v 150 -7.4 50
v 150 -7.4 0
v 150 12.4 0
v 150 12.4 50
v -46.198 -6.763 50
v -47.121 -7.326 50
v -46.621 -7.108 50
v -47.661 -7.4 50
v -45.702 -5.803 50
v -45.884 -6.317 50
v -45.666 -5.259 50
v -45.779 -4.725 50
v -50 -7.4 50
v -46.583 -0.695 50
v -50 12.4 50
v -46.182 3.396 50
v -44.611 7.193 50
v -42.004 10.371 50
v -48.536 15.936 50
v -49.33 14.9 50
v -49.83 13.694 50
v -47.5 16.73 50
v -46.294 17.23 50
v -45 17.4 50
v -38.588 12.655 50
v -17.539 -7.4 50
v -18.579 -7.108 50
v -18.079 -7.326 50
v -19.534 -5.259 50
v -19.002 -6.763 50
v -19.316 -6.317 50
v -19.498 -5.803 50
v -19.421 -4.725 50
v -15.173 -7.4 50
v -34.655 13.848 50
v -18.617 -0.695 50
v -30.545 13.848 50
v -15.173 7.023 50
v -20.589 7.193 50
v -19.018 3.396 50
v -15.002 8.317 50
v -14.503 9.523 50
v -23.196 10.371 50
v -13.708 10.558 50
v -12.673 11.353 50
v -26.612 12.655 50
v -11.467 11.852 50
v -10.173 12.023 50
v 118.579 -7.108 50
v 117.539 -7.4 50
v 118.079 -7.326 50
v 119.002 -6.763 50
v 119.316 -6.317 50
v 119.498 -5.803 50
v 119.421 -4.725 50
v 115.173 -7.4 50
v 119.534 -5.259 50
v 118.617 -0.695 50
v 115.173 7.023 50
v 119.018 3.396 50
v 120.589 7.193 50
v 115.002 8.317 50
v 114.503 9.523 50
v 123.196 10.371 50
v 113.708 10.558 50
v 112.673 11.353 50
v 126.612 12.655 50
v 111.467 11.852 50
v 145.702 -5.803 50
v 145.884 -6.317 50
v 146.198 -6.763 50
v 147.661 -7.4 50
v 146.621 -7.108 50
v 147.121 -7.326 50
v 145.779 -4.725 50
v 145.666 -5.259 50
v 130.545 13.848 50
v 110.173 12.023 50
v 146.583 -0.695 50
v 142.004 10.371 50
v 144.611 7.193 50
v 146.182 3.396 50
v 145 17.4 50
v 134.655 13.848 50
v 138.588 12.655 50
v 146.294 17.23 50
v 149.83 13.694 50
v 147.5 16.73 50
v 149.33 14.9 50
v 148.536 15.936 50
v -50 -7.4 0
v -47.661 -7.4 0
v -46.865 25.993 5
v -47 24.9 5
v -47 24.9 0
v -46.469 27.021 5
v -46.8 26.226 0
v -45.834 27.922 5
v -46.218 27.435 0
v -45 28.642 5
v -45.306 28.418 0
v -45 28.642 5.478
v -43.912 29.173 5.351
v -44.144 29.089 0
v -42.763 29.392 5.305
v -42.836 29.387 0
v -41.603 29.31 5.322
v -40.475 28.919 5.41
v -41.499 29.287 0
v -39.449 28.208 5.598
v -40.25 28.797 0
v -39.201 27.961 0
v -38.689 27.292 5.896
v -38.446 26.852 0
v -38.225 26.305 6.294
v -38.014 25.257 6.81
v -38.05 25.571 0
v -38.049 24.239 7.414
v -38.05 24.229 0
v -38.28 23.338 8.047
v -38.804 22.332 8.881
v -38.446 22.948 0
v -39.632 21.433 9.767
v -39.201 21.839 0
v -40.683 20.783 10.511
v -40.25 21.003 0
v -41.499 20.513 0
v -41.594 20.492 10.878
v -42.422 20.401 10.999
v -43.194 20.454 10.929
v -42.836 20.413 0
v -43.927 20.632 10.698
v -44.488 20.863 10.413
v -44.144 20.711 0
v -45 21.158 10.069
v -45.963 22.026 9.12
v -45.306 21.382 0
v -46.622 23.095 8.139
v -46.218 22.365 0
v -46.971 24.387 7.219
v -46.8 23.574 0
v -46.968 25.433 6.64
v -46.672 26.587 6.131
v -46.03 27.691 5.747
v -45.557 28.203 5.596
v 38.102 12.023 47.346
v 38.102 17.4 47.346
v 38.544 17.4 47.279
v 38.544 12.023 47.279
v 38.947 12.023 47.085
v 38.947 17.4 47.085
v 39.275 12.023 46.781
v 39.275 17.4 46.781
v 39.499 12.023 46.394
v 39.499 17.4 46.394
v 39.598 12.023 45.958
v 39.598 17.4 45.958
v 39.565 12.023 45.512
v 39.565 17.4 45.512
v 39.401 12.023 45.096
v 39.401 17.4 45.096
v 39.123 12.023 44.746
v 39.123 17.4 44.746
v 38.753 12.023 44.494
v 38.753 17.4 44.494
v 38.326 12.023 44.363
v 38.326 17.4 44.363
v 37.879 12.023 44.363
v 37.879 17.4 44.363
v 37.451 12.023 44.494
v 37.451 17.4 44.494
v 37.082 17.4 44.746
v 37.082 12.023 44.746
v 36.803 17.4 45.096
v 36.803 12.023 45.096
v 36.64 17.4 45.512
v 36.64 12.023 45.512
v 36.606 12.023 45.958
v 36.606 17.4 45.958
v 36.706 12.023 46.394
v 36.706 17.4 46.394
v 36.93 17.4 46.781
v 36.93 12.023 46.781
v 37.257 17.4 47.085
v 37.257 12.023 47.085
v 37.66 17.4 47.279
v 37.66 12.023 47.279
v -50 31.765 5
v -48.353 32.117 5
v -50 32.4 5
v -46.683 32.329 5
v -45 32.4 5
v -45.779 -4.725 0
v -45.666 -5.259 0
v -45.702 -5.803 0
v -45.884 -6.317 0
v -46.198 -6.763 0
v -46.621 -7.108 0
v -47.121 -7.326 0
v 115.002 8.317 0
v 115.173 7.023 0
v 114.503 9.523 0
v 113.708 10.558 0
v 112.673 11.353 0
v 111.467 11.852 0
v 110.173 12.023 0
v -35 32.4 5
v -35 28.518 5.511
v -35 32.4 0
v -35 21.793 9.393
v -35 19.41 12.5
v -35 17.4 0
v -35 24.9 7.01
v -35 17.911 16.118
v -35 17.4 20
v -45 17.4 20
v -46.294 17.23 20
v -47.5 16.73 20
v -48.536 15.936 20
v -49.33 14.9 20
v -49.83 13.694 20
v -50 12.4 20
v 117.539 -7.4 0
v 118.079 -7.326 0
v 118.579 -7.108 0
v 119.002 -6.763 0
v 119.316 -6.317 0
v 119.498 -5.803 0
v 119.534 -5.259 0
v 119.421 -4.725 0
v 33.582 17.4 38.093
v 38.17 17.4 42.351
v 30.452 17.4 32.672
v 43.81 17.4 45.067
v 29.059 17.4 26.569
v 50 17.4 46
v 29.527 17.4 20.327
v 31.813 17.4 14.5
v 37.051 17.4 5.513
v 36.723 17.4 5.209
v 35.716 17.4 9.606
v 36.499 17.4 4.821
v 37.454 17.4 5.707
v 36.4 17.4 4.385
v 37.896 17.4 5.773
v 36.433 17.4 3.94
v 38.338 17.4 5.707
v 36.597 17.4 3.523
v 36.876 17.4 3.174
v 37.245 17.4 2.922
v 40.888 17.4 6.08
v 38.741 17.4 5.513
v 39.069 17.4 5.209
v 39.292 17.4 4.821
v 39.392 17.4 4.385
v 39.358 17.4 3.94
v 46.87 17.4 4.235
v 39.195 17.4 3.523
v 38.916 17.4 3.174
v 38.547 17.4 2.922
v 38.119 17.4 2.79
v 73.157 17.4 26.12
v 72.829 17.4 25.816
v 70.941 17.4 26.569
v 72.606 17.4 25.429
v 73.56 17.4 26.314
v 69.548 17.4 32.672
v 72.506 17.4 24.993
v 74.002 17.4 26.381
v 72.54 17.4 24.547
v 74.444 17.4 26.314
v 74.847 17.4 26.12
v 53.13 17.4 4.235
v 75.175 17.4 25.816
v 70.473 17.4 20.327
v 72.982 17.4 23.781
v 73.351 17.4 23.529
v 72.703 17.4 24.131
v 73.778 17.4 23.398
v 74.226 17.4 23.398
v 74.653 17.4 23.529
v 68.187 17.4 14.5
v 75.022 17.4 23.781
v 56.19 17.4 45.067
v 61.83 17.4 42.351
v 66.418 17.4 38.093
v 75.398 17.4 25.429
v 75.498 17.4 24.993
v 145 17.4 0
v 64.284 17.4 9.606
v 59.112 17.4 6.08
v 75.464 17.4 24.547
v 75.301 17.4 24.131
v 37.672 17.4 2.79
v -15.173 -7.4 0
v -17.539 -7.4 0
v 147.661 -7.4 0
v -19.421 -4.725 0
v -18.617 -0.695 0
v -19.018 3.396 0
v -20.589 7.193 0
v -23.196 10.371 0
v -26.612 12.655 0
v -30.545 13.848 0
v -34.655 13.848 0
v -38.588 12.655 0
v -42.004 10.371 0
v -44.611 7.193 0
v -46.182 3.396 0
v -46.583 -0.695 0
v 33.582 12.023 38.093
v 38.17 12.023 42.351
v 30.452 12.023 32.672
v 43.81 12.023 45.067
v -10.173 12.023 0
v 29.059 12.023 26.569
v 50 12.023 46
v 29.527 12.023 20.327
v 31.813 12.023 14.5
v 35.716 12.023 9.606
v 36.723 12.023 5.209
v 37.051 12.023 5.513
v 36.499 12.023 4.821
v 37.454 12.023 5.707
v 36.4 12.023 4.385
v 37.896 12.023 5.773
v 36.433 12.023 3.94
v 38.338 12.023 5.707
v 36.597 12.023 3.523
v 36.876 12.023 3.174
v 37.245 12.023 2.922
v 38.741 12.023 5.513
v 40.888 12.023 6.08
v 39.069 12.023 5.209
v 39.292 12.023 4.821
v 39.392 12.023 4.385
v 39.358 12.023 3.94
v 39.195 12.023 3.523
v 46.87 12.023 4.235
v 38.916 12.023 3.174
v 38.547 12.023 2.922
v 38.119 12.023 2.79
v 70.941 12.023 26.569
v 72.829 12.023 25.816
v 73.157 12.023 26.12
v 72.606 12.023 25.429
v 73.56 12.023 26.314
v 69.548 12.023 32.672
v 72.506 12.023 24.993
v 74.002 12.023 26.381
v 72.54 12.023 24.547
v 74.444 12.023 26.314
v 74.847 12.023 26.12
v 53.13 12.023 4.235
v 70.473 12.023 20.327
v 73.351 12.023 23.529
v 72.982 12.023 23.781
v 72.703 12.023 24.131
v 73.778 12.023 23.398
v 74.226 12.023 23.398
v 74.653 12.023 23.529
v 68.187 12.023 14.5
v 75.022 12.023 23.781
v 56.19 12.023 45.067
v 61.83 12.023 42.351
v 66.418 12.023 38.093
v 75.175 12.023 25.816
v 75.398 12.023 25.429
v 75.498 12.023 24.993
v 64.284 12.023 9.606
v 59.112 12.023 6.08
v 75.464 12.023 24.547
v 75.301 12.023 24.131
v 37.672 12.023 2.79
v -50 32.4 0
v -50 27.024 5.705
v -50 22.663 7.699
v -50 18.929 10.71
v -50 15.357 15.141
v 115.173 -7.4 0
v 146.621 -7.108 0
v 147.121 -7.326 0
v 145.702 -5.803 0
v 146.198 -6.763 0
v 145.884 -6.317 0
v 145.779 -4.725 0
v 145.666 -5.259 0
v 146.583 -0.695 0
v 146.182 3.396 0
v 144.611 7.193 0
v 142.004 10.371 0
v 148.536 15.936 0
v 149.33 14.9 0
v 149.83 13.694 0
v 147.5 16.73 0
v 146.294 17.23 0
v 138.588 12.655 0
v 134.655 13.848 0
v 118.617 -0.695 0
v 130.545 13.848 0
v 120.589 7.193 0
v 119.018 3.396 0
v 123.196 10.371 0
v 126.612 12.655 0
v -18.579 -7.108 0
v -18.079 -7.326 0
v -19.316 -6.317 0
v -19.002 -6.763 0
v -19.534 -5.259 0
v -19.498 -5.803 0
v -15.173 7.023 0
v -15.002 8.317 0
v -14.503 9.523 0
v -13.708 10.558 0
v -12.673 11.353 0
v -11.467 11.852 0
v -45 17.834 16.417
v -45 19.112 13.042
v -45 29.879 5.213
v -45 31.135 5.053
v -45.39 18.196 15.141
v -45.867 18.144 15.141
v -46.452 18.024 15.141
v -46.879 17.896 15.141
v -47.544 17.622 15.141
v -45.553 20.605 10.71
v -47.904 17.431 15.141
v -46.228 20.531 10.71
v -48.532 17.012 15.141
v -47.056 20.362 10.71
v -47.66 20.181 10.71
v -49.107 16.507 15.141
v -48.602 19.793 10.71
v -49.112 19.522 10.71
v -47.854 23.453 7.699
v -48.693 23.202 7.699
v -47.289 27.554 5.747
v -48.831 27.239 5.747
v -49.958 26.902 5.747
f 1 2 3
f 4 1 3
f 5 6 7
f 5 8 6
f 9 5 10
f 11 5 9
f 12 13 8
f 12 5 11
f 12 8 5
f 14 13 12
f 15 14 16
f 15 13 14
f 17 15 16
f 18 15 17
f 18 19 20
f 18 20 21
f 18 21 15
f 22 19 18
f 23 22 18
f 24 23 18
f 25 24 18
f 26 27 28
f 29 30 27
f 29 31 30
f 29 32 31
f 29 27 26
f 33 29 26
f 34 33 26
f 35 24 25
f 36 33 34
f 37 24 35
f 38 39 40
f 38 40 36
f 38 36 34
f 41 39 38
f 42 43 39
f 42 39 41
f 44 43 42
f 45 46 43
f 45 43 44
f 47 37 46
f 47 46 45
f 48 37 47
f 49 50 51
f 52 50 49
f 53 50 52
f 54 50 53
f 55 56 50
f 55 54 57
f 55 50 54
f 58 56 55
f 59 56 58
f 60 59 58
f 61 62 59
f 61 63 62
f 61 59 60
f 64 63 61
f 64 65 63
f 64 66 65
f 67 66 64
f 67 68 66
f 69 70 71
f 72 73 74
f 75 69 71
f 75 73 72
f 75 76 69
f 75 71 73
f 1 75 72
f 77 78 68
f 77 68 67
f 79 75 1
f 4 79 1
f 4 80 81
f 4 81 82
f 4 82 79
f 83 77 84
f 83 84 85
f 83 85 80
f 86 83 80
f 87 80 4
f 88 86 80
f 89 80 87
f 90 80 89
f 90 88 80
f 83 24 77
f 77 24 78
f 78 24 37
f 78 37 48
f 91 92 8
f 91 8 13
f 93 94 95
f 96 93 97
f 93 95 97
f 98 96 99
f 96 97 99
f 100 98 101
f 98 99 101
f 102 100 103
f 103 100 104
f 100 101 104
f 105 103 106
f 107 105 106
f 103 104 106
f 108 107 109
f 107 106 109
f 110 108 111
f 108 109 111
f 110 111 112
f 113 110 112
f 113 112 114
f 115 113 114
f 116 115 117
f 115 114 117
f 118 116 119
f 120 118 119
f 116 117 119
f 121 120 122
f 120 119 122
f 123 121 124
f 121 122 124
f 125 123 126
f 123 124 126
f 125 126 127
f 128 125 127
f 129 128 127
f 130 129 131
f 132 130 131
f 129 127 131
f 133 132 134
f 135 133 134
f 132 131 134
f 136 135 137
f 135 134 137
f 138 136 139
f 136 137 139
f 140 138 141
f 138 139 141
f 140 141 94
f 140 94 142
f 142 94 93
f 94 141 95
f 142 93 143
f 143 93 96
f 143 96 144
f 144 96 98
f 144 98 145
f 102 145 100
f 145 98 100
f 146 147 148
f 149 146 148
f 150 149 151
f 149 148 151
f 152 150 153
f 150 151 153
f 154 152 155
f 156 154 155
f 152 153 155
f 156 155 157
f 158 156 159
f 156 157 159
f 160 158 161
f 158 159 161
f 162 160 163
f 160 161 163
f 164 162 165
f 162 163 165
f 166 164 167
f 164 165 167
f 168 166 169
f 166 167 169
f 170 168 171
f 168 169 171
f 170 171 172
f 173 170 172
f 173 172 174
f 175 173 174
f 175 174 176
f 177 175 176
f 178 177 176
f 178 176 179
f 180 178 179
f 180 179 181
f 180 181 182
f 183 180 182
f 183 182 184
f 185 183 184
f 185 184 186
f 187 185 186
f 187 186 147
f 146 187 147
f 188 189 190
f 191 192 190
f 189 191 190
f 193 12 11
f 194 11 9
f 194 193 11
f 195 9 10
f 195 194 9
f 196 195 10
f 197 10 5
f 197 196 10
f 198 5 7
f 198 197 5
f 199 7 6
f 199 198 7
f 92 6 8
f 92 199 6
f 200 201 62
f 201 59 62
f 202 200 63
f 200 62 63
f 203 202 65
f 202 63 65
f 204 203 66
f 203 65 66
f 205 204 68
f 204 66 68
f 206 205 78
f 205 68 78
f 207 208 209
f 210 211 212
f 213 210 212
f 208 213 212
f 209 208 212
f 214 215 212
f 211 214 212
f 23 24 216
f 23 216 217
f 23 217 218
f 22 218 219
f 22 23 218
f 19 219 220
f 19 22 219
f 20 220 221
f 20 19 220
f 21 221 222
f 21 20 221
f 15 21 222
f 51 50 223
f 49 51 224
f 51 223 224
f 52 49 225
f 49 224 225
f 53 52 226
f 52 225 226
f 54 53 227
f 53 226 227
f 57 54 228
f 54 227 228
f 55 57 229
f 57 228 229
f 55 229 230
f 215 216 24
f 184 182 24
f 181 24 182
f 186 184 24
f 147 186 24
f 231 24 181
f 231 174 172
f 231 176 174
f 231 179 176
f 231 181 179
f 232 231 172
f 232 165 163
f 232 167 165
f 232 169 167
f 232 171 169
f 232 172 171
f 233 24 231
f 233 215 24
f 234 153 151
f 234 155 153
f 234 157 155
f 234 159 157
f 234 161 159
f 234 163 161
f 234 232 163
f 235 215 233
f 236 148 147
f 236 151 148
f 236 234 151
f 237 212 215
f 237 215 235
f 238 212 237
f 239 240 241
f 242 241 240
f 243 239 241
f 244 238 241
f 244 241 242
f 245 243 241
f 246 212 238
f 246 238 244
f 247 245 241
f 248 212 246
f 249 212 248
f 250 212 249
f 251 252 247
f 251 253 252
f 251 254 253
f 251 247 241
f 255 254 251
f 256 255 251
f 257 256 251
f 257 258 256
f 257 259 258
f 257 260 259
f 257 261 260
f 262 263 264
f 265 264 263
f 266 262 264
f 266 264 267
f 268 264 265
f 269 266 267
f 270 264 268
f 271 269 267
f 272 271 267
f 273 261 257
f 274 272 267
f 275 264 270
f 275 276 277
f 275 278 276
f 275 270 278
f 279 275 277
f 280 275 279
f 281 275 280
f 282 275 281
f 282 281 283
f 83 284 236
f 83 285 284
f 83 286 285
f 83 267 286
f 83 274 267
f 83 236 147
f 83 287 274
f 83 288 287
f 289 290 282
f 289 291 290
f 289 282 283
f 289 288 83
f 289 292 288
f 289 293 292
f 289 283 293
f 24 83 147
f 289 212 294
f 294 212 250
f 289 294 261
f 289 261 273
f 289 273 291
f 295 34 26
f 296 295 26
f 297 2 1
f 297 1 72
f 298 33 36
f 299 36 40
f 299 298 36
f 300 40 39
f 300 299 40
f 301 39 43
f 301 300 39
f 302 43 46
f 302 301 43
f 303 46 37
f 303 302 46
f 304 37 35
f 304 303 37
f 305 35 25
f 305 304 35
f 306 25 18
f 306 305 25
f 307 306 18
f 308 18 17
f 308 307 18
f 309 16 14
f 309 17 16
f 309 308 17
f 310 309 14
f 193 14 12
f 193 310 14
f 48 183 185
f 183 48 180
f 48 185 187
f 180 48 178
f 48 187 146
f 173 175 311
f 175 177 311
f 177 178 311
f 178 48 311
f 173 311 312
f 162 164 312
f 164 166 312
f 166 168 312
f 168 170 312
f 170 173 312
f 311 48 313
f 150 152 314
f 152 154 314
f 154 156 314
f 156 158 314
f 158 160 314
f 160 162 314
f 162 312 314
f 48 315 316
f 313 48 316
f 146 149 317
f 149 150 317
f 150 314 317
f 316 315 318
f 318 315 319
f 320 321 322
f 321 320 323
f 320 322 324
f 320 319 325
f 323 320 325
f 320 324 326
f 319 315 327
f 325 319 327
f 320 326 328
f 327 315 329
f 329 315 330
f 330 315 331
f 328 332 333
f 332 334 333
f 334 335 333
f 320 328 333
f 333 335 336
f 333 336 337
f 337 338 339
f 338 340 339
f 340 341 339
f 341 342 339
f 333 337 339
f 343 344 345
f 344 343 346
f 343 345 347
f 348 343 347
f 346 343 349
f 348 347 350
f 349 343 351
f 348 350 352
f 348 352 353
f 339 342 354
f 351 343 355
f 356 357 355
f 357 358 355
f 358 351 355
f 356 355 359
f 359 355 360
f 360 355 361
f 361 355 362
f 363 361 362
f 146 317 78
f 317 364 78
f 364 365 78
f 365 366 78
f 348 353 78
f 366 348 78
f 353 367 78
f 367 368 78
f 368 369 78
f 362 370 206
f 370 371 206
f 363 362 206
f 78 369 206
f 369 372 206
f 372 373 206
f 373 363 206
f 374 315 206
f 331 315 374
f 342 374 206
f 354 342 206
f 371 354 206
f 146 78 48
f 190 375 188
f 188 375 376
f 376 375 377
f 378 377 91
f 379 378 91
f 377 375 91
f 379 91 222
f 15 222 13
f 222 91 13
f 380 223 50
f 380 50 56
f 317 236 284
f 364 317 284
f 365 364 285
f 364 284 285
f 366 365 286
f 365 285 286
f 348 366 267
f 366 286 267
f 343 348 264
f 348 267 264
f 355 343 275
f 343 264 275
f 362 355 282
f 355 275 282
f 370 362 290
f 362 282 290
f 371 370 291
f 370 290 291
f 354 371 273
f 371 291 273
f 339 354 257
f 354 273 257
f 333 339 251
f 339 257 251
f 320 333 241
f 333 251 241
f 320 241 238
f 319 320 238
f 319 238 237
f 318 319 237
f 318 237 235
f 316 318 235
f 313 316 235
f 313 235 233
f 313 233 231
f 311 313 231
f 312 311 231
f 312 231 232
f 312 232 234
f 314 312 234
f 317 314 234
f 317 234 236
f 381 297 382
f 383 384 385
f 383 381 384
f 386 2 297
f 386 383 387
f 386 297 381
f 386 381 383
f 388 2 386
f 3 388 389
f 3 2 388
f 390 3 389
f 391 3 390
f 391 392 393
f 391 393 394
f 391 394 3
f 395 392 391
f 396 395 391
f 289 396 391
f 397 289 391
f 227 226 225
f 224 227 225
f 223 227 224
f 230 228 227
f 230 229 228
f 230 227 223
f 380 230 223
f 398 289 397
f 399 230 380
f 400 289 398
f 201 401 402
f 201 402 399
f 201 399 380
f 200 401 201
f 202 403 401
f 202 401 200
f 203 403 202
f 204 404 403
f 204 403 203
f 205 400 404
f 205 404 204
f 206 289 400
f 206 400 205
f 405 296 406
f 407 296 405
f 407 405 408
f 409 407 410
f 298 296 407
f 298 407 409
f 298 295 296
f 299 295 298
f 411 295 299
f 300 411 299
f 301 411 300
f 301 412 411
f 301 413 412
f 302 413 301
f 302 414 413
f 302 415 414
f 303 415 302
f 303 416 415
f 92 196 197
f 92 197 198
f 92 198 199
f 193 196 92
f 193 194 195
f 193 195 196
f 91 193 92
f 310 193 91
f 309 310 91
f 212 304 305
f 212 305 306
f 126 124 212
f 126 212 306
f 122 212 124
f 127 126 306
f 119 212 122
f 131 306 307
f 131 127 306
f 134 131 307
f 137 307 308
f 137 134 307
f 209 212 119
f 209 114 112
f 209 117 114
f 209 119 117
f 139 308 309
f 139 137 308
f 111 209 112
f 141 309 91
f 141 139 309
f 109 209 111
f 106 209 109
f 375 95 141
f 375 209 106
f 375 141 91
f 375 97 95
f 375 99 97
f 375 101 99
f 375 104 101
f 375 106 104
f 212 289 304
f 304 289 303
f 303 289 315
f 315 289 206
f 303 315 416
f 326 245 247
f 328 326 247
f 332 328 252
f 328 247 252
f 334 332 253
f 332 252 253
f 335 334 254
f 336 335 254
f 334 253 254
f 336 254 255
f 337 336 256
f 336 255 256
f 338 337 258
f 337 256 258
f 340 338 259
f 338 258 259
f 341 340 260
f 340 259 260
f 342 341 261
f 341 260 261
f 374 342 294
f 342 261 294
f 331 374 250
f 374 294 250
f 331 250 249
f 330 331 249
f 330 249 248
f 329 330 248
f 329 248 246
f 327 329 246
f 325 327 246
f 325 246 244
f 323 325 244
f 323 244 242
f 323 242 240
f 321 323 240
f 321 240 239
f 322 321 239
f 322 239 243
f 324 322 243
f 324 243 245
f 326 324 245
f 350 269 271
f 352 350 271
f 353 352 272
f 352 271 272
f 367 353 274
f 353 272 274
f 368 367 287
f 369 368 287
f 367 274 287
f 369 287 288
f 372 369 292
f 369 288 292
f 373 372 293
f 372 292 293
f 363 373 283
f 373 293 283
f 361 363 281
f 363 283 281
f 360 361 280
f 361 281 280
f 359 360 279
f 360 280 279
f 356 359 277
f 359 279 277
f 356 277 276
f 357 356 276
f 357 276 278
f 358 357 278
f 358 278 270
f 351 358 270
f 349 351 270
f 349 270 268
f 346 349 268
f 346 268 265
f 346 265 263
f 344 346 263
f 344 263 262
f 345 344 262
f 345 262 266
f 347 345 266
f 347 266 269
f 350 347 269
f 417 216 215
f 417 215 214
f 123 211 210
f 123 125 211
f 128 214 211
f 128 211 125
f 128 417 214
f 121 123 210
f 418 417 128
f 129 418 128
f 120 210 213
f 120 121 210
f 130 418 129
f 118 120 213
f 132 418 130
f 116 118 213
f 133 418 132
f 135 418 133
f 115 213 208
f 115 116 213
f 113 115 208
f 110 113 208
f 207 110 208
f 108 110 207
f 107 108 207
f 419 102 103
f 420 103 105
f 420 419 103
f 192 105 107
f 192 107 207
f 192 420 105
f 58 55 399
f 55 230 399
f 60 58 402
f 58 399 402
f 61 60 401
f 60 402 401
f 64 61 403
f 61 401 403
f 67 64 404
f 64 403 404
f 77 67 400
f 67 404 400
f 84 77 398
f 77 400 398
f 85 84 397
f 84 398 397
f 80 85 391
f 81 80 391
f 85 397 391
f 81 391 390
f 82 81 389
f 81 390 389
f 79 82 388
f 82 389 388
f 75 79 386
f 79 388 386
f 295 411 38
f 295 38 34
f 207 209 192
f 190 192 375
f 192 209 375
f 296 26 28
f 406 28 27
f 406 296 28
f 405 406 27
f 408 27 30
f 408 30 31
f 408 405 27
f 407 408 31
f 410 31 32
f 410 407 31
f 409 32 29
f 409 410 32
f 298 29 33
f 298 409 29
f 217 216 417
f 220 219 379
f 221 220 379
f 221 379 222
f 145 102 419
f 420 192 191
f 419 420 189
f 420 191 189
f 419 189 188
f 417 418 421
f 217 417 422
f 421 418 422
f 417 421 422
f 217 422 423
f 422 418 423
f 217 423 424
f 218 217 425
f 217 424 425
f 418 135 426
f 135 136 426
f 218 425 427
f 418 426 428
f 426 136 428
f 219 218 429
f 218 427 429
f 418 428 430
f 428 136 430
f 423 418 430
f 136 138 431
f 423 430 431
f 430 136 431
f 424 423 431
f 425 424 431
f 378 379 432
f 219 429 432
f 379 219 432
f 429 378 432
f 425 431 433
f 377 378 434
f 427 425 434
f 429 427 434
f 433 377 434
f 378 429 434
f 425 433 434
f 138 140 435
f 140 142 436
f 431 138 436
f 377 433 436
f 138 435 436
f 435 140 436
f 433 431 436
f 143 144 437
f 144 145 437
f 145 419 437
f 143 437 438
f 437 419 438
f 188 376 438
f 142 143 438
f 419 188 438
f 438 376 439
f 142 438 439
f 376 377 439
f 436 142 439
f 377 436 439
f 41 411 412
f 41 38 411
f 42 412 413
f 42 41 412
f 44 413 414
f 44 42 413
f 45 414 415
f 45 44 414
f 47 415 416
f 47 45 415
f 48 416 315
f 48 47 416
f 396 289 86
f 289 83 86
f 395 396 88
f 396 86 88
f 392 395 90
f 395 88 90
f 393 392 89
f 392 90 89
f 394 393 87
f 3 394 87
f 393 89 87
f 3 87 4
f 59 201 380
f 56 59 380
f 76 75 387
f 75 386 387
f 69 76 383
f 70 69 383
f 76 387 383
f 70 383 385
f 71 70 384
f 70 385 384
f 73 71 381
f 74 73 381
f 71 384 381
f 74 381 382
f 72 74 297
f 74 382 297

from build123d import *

# Parameters (mm, degrees)
SKETCH1_R           = 14
BOSS_EXTRUDE1_DEPTH = 50
SKETCH2_R           = 21
CUT_EXTRUDE1_DEPTH  = 45
SKETCH3_R           = 1.5
CUT_EXTRUDE2_DEPTH  = 45
SKETCH4_W           = 15
SKETCH4_H           = 15
BOSS_EXTRUDE2_DEPTH = 5
SKETCH5_R           = 4.5
CUT_EXTRUDE3_DEPTH  = 5
FILLET1_R           = 5
FILLET2_R           = 15
SKETCH7_W           = 200
SKETCH7_H           = 10
CUT_EXTRUDE4_DEPTH  = 50
FILLET3_R           = 2


with BuildPart() as part:
    # Sketch1 → Boss-Extrude1 (new body)
    with BuildSketch(Plane.XY):
        Polygon((-50, 17.4), (-15.2, 17.4), (50, 17.4), (50, 12.022605171), (-15.17275181, 12.022605171), (-15.17275181, -17.4), (-50, -17.4), align=None)
        with Locations((-32.6, 0)):
            Circle(SKETCH1_R, mode=Mode.SUBTRACT)
    boss_extrude1 = extrude(amount=BOSS_EXTRUDE1_DEPTH)

    # Mirror1: Boss-Extrude1 across plane
    add(boss_extrude1.mirror(Plane(origin=(50, 17.4, 50), x_dir=(0, 0, 1), z_dir=(-1, 0, 0))))

    # Sketch2 → Cut-Extrude1 (cut)
    with BuildSketch(Plane(origin=(0, 17.4, 0), x_dir=(1, 0, 0), z_dir=(0, 1, 0))):
        with Locations(Location((50, -25, 0), (0, 0, 270))):
            Circle(SKETCH2_R)
    extrude(amount=-CUT_EXTRUDE1_DEPTH, mode=Mode.SUBTRACT)

    # Sketch3 → Cut-Extrude2 (cut)
    with BuildSketch(Plane(origin=(0, 17.4, 0), x_dir=(1, 0, 0), z_dir=(0, 1, 0))):
        with Locations(Location((37.89578471, -4.273302643, 0), (0, 0, 270))):
            Circle(SKETCH3_R)
        with Locations(Location((74.001954093, -24.880790745, 0), (0, 0, 270))):
            Circle(SKETCH3_R)
        with Locations(Location((38.102261197, -45.845906612, 0), (0, 0, 270))):
            Circle(SKETCH3_R)
    extrude(amount=-CUT_EXTRUDE2_DEPTH, mode=Mode.SUBTRACT)

    # Sketch4 → Boss-Extrude2 (add)
    with BuildSketch(Plane(origin=(0, 0, 0), x_dir=(-1, 0, 0), z_dir=(0, 0, -1))):
        with Locations((42.5, 24.9)):
            Rectangle(SKETCH4_W, SKETCH4_H)
    extrude(amount=-BOSS_EXTRUDE2_DEPTH)

    # Sketch5 → Cut-Extrude3 (cut)
    with BuildSketch(Plane(origin=(0, 0, 0), x_dir=(-1, 0, 0), z_dir=(0, 0, -1))):
        with Locations((42.5, 24.9)):
            Circle(SKETCH5_R)
    extrude(amount=-CUT_EXTRUDE3_DEPTH, mode=Mode.SUBTRACT)

    # Fillet1
    fillet1_edges = [part.edges().sort_by_distance(p)[0] for p in [
        (-50, 17.4, 27.5),
        (-15.17275181, 12.022605171, 25),
        (-15.17275181, -17.4, 25),
        (-50, -17.4, 25),
        (150, -17.4, 25),
        (150, 17.4, 25),
        (115.17275181, 12.022605171, 25),
        (115.17275181, -17.4, 25),
    ]]
    fillet(fillet1_edges, radius=FILLET1_R)

    # Fillet2
    # the kernel refuses this fillet: 15 mm, written as the material it adds along each edge
    with BuildSketch(Plane(origin=(-45, 12.4, 5), x_dir=(0, 1, 0), z_dir=(1, 0, 0))) as fillet2_piece_1_section:
        with BuildLine():
            CenterArc((5 + FILLET2_R, FILLET2_R), FILLET2_R, 180, 90)
            Line((5 + FILLET2_R, 0), (5, 0))
            Line((5, 0), (5, FILLET2_R))
        make_face()
    fillet2_piece_1 = revolve(axis=Axis((-45, 12.4, 5), (0, 0, 1)), revolution_arc=359.64, mode=Mode.PRIVATE)
    fillet2_piece_1 = split(fillet2_piece_1, bisect_by=Plane(origin=(-50, 16.22028394, 10.678167657), z_dir=(1, 0, 0)), keep=Keep.TOP, mode=Mode.PRIVATE)
    fillet2_piece_1 = fillet2_piece_1 - Plane(origin=(-42.5, 24.9, 10.678167657), x_dir=(-1, 0, 0), z_dir=(0, 0, -1)) * Cylinder(4.5, 80, mode=Mode.PRIVATE)
    fillet2_piece_1 = fillet2_piece_1 - Plane(origin=(-32.6, 0, 10.678167657), x_dir=(1, 0, 0), z_dir=(0, 0, -1)) * Cylinder(14, 80, mode=Mode.PRIVATE)
    fillet2_piece_1 = split(fillet2_piece_1, bisect_by=Plane(origin=(-35, 16.22028394, 10.678167657), z_dir=(-1, 0, 0)), keep=Keep.TOP, mode=Mode.PRIVATE)
    add(fillet2_piece_1)
    with BuildSketch(Plane(origin=(-45, 17.4, 5), x_dir=(0, 0, 1), z_dir=(1, 0, 0))) as fillet2_piece_2_section:
        with BuildLine():
            CenterArc((FILLET2_R, -FILLET2_R), FILLET2_R, 90, 90)
            Line((0, -FILLET2_R), (0, 0))
            Line((0, 0), (FILLET2_R, 0))
        make_face()
    fillet2_piece_2 = extrude(amount=10, mode=Mode.PRIVATE)
    fillet2_piece_2 = fillet2_piece_2 - Plane(origin=(-42.5, 24.9, 8.942844525), x_dir=(-1, 0, 0), z_dir=(0, 0, -1)) * Cylinder(4.5, 80, mode=Mode.PRIVATE)
    add(fillet2_piece_2)

    # Sketch7 → Cut-Extrude4 (cut)
    with BuildSketch(Plane(origin=(0, 0, 0), x_dir=(-1, 0, 0), z_dir=(0, 0, -1))):
        with Locations((-50, -12.4)):
            Rectangle(SKETCH7_W, SKETCH7_H)
    extrude(amount=-CUT_EXTRUDE4_DEPTH, mode=Mode.SUBTRACT)

    # Fillet3
    fillet3_edges = [part.edges().sort_by_distance(p)[0] for p in [
        (120.715556387, -7.4, 25),
        (144.484443613, -7.4, 25),
        (-20.715556387, -7.4, 25),
        (-44.484443613, -7.4, 25),
    ]]
    fillet(fillet3_edges, radius=FILLET3_R)


solid = part.part
